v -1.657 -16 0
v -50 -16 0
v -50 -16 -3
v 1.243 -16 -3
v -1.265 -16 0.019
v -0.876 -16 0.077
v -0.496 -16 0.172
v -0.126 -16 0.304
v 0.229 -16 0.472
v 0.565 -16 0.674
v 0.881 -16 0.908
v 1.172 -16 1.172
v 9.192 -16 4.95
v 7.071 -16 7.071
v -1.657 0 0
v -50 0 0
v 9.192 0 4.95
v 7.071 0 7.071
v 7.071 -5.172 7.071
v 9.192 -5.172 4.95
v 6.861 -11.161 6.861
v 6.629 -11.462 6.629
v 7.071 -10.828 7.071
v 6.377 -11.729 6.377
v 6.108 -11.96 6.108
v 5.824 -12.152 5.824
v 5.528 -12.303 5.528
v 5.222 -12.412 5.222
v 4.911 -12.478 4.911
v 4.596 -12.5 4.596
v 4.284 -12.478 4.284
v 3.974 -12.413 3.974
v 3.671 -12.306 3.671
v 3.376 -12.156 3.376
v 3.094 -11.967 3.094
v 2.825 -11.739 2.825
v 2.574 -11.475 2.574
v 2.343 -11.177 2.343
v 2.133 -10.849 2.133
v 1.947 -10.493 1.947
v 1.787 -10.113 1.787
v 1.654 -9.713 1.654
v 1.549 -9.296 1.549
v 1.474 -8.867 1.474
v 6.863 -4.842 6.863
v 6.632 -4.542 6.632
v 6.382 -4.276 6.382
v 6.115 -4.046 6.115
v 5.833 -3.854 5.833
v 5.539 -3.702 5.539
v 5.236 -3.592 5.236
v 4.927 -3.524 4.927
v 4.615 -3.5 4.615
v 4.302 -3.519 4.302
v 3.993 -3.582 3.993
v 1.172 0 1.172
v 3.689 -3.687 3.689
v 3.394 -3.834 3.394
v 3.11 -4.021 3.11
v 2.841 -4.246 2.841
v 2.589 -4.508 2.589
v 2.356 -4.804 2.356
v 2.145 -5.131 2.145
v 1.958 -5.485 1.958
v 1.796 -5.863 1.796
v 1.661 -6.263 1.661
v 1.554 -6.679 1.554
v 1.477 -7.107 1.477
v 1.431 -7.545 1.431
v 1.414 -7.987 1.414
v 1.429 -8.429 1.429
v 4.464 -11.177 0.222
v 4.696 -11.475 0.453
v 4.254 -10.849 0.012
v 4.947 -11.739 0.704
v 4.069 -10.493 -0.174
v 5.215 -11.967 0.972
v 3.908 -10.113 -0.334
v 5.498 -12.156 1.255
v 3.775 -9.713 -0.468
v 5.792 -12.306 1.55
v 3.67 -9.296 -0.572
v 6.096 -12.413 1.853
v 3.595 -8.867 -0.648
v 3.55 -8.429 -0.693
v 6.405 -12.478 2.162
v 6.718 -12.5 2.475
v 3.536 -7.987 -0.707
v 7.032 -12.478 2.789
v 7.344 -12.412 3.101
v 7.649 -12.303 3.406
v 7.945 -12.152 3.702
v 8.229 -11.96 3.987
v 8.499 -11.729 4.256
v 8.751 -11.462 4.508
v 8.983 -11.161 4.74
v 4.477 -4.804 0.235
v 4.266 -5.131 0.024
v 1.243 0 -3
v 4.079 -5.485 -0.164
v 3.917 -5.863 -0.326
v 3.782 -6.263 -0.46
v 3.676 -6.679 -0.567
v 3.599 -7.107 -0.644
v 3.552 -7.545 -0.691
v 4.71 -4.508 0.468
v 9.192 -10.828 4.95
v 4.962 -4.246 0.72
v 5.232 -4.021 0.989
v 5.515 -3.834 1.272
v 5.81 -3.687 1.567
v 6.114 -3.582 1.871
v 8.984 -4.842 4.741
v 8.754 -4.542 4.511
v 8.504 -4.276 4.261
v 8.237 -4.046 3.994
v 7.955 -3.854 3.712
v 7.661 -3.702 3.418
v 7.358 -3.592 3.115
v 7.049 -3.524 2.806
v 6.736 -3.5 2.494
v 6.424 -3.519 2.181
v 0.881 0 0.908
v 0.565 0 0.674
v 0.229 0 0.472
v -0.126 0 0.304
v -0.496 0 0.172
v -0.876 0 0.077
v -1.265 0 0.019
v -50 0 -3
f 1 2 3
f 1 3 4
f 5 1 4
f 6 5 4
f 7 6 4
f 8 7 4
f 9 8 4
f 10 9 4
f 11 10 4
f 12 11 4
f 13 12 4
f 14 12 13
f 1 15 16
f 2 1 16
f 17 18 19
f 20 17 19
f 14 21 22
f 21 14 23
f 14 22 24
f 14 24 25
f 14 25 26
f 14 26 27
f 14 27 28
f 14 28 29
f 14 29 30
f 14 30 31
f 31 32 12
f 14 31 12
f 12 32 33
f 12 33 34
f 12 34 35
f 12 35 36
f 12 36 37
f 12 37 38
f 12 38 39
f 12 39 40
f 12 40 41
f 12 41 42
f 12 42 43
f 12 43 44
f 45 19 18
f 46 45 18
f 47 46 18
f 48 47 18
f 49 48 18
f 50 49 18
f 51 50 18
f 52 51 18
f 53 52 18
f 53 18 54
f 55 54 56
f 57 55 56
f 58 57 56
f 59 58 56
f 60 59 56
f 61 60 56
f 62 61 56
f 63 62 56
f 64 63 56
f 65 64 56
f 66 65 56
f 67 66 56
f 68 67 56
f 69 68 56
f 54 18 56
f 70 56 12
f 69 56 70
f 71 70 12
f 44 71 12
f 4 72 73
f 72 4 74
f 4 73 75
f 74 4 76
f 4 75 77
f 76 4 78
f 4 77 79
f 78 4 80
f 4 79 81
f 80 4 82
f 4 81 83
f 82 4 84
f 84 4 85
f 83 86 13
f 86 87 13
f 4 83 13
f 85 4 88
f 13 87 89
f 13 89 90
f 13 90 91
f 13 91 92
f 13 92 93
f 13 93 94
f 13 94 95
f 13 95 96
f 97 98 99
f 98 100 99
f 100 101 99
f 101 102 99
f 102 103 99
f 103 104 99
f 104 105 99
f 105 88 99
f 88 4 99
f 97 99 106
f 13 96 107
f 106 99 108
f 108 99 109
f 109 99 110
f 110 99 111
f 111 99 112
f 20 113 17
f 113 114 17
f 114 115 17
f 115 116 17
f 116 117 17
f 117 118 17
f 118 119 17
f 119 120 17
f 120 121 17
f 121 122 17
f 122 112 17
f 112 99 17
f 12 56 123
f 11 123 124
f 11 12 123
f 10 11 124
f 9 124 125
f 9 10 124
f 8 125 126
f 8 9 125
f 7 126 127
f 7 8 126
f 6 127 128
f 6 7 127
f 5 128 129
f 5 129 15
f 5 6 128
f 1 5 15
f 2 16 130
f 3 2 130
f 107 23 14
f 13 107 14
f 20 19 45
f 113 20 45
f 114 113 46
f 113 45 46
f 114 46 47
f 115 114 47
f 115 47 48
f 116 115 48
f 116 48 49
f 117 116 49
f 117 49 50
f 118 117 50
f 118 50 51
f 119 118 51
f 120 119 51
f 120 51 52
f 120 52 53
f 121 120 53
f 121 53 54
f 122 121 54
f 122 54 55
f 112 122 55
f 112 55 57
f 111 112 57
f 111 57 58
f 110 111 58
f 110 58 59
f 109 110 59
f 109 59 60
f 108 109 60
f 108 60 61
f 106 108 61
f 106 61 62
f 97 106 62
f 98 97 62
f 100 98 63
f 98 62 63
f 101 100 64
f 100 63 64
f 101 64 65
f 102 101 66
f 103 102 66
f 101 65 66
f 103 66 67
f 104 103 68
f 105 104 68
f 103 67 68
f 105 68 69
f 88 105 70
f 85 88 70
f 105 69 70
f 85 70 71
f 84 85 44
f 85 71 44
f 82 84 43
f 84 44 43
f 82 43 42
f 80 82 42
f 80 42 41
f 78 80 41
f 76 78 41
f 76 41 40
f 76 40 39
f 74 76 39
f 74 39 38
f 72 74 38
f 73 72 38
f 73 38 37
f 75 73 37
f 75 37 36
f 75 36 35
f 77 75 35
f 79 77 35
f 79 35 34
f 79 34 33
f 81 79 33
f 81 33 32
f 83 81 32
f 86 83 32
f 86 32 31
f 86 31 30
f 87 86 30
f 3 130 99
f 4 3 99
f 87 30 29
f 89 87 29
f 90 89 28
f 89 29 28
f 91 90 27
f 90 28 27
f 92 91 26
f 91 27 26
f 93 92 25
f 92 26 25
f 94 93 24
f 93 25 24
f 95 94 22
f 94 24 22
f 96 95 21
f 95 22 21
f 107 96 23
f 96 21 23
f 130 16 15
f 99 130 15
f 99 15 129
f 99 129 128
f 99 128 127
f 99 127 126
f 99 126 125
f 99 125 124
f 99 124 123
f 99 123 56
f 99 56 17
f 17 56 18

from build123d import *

# Parameters (mm, degrees)
F1_DEPTH = 16
F3_DEPTH = 25
F4_R     = 4


with BuildPart() as f1:
    # F0 (on Front) → F1 (new body)
    with BuildSketch(Plane.XZ):
        Polygon((9.1923881554, 9.1923881554), (0, 0), (-50, 0), (-50, -3), (1.2426406871, -3), (11.313708499, 7.0710678119), align=None)
    extrude(amount=F1_DEPTH)

    # F2 (on face) → F3 (cut)
    with BuildSketch(Plane(origin=(0, 0, 0), x_dir=(0, -1, 0), z_dir=(-0.7071067812, 0, 0.7071067812))):
        with BuildLine():
            Line((5.1715728753, 10), (10.8284271247, 10))
            ThreePointArc((10.8284271247, 10), (8, 11), (5.1715728753, 10))
        make_face()
        with BuildLine():
            ThreePointArc((5.1715728753, 10), (6.0606601718, 2.4393398282), (12.5, 6.5))
            ThreePointArc((12.5, 6.5), (12.0606601718, 8.4393398282), (10.8284271247, 10))
            Line((10.8284271247, 10), (5.1715728753, 10))
        make_face()
        with BuildLine():
            ThreePointArc((5.1715728753, 10), (8, 11), (10.8284271247, 10))
            Line((10.8284271247, 10), (16, 10))
            Line((16, 10), (16, 13))
            Line((16, 13), (0, 13))
            Line((0, 13), (0, 10))
            Line((0, 10), (5.1715728753, 10))
        make_face()
    extrude(amount=-F3_DEPTH, mode=Mode.SUBTRACT)

    # F4
    f4_edges = [f1.edges().sort_by_distance(p)[0] for p in [
        (0, -8, 0),
    ]]
    fillet(f4_edges, radius=F4_R)


solid = f1.part
